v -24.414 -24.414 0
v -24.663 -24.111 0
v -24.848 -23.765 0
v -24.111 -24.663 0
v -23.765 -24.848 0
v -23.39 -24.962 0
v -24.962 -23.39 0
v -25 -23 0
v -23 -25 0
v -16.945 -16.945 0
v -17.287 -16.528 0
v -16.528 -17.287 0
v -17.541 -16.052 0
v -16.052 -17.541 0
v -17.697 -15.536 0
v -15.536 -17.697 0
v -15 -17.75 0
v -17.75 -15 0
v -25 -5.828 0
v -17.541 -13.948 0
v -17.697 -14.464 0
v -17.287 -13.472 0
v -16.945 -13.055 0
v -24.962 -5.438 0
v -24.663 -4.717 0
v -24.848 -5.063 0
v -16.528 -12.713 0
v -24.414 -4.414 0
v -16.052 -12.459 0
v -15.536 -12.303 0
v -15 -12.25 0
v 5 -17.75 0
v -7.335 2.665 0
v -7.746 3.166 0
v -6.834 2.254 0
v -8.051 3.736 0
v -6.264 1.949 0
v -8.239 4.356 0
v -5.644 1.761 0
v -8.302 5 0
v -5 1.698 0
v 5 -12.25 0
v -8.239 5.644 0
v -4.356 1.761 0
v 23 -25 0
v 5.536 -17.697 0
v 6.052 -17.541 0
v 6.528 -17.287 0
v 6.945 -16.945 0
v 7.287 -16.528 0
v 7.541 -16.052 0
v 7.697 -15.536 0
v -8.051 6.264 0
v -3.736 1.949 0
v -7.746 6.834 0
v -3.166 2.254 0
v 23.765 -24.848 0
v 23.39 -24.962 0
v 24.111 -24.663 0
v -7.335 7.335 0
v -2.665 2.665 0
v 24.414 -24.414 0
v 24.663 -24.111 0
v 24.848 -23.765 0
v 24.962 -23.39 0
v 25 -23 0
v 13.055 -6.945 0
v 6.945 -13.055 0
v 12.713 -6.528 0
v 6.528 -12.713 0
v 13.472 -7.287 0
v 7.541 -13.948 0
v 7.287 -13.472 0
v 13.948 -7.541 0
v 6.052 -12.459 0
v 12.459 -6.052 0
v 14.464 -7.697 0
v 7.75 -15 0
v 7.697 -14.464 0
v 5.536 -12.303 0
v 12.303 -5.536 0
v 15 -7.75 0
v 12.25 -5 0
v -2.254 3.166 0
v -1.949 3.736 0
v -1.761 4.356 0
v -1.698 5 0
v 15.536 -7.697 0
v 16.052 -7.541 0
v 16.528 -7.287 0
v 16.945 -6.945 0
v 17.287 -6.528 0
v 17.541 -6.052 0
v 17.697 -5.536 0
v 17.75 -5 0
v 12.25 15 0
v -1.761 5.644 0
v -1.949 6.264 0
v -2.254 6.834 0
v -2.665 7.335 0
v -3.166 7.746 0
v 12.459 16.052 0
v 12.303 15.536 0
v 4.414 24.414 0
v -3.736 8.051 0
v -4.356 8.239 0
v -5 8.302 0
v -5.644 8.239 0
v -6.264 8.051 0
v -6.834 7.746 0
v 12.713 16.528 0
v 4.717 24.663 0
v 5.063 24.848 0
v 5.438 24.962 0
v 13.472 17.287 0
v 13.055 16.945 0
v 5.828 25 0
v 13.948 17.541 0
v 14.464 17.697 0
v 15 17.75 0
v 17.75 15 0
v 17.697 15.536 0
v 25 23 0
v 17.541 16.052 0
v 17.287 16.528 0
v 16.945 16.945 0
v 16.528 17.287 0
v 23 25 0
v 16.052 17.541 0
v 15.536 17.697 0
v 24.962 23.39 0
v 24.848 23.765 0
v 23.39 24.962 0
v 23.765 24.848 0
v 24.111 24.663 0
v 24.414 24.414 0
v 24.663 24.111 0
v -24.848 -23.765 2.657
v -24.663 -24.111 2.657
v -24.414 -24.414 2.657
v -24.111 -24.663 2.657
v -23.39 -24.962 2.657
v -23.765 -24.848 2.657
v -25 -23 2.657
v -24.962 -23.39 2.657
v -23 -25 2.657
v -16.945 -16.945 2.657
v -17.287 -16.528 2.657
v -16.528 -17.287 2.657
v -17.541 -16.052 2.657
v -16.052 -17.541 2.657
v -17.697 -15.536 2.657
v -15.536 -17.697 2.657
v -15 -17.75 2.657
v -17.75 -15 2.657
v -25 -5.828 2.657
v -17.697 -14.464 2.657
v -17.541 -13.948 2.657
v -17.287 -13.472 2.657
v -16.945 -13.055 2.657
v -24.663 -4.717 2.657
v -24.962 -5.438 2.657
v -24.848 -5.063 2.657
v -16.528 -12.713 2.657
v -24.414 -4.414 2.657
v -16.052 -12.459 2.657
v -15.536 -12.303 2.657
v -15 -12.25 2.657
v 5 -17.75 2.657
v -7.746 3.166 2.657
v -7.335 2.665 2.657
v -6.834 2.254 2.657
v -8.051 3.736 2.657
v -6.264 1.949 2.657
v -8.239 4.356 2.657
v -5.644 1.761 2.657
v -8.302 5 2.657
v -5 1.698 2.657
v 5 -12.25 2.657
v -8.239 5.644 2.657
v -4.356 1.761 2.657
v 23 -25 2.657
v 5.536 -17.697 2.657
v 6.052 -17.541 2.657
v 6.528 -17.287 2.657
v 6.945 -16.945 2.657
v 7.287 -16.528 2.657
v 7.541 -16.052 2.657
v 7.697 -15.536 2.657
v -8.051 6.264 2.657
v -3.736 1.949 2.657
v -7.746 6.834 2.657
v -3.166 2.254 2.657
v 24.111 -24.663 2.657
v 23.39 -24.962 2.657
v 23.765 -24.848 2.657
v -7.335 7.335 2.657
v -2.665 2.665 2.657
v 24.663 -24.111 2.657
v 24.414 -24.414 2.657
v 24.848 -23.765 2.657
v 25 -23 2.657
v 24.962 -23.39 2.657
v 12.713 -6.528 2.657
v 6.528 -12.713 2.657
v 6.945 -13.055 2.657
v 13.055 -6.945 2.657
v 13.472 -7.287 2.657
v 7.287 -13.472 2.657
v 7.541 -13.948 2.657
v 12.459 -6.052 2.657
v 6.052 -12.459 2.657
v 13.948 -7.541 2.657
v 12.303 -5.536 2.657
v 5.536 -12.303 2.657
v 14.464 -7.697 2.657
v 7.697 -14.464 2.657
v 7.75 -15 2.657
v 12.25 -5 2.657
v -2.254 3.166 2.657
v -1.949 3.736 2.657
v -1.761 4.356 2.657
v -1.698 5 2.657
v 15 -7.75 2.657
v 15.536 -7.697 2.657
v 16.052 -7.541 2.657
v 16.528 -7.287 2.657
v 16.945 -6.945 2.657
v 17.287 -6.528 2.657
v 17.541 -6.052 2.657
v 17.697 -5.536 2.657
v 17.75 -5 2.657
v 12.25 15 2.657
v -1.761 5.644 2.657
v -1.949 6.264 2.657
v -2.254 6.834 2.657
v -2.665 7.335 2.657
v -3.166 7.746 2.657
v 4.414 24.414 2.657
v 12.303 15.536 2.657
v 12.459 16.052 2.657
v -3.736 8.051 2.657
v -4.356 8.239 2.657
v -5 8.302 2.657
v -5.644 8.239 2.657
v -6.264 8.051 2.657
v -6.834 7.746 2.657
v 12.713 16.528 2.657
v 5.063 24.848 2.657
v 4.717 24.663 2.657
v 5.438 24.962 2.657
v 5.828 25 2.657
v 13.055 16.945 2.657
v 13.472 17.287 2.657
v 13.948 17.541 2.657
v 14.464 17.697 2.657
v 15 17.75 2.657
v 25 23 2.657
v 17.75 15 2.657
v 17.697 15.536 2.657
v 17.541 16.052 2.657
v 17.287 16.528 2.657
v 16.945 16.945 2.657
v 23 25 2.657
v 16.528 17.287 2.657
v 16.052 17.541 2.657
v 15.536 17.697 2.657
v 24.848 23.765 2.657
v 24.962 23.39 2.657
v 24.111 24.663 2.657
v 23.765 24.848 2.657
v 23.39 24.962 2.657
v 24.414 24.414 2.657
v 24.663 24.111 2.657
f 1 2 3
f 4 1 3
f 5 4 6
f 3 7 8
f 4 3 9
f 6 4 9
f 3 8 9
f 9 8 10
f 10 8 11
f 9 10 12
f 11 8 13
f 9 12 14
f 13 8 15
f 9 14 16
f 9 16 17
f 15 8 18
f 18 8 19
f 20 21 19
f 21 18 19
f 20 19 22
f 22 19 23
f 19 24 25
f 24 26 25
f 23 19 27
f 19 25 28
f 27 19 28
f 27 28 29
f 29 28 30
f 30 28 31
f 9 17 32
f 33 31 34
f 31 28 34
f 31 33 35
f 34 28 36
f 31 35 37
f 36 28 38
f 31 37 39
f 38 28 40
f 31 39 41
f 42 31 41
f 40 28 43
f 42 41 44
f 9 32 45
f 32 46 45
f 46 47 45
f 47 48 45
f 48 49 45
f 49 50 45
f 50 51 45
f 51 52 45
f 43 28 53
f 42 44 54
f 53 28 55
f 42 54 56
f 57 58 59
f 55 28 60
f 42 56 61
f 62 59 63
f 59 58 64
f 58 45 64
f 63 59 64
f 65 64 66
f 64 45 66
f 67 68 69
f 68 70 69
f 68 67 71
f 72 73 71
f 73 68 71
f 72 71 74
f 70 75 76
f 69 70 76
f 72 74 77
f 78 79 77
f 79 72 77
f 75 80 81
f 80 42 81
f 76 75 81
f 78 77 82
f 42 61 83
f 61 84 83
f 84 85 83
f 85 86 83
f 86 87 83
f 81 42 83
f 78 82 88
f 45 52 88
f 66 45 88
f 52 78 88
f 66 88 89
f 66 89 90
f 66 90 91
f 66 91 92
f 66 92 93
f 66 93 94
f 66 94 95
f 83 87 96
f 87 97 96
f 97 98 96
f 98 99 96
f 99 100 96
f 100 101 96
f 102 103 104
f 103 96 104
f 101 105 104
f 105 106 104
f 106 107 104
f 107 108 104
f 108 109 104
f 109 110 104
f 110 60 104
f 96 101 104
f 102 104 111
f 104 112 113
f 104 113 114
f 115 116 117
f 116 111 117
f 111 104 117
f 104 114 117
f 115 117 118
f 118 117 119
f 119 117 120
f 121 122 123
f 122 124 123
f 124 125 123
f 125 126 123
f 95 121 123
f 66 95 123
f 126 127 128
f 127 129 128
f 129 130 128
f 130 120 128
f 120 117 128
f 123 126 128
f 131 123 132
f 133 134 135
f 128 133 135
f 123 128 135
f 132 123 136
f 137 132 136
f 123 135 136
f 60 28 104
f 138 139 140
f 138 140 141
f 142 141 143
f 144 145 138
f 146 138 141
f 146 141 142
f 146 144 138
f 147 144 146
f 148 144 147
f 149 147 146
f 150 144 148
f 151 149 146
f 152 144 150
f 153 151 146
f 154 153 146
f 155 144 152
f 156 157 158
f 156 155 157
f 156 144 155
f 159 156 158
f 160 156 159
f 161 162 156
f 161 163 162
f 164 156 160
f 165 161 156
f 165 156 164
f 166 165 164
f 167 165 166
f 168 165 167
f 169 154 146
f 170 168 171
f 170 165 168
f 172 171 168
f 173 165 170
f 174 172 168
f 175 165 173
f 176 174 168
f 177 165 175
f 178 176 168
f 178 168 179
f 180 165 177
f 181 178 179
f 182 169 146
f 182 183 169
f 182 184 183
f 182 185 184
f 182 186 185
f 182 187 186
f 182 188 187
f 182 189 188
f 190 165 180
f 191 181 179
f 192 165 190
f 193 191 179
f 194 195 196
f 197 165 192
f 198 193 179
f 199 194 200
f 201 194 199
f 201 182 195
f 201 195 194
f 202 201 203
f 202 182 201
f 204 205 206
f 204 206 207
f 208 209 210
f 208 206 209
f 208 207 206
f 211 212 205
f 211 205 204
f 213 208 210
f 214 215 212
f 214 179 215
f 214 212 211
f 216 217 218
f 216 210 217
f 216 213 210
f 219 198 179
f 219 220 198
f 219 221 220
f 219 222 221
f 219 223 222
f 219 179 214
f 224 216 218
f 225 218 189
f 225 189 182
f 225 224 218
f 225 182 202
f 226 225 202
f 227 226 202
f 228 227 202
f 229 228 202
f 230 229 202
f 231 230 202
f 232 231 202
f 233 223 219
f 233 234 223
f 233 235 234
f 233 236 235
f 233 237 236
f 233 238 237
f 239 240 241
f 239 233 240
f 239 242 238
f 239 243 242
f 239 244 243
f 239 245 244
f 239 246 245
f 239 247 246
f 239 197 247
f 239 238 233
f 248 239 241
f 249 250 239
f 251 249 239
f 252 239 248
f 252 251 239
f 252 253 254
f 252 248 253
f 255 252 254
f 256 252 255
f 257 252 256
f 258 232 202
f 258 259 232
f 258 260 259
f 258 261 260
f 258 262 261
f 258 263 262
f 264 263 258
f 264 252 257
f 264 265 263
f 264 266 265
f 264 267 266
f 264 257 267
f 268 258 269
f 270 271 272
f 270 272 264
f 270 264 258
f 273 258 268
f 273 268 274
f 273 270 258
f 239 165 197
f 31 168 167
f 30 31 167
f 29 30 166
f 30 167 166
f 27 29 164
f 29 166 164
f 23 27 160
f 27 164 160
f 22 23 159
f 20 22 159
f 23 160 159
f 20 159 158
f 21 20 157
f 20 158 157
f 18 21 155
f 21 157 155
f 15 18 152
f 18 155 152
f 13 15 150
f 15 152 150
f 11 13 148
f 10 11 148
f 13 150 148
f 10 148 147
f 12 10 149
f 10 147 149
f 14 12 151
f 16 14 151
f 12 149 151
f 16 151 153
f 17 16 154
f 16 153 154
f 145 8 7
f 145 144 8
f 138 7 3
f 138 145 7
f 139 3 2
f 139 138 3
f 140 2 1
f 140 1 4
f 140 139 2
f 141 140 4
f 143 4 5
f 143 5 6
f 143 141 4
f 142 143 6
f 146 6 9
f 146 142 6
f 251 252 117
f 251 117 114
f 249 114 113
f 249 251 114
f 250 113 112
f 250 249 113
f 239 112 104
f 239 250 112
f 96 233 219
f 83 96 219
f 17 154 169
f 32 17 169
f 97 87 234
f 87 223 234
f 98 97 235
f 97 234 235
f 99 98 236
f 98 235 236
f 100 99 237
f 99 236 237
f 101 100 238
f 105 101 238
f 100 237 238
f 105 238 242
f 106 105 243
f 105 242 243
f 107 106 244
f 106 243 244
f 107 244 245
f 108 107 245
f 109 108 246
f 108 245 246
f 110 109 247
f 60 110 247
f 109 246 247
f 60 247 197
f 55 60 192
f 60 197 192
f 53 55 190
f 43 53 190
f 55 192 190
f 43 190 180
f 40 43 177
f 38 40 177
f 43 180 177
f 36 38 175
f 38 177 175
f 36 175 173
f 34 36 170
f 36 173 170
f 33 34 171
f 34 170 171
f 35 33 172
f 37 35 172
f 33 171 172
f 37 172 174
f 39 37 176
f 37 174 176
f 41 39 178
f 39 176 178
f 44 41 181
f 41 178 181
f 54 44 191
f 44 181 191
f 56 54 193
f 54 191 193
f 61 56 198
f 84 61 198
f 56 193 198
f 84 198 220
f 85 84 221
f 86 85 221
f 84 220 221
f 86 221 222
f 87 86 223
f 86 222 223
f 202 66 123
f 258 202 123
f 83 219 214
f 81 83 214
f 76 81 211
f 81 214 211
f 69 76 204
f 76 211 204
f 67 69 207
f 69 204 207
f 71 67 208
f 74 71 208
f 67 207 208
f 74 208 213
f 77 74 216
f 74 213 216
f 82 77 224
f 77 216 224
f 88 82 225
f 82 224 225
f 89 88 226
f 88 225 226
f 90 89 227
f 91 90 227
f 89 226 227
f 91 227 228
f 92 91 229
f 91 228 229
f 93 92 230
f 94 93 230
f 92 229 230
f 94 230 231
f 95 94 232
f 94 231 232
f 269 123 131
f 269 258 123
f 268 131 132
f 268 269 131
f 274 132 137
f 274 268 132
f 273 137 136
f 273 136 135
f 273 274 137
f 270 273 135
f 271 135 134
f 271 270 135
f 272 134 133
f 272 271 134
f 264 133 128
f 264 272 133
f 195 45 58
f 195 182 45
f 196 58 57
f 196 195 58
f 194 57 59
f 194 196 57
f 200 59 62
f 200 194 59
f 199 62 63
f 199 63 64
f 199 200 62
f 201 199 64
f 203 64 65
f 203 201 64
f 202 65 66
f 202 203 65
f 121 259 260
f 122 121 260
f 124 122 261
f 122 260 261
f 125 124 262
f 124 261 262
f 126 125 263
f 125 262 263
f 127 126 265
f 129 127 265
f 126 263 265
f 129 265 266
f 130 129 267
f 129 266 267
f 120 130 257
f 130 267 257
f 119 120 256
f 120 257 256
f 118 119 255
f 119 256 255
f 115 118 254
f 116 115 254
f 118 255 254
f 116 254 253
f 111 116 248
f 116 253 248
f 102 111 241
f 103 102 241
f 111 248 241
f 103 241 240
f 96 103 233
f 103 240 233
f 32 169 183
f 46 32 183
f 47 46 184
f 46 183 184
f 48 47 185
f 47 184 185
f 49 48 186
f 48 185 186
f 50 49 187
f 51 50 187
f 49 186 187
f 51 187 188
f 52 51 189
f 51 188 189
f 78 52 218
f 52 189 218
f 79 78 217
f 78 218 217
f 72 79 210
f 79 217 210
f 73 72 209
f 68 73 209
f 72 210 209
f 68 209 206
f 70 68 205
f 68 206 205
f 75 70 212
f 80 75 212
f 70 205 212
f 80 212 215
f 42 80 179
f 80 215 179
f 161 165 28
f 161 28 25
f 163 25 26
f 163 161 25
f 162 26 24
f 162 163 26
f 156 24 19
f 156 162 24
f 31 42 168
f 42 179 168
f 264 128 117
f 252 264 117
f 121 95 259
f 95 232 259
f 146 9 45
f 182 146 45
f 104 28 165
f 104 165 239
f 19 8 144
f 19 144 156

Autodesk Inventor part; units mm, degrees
ref_plane "YZ Plane" through (0, 0, 0) normal (1, 0, 0) x (0, 1, 0)
ref_plane "XZ Plane" through (0, 0, 0) normal (0, 1, 0) x (-1, 0, 0)
ref_plane "XY Plane" through (0, 0, 0) normal (0, 0, 1) x (1, 0, 0)
sketch "Sketch1" plane through (0, 0, 0) normal (0, 0, 1) x (1, 0, 0)
  line L0 (-25, -25) -> (25, -25)
  line L1 (25, -25) -> (25, 25)
  line L2 (25, 25) -> (5, 25)
  line L3 (-25, -25) -> (-25, -5)
  line L4 (-25, -5) -> (5, 25)
  point P0 (0, 0)
  dimension "d0" = 50
  dimension "d1" = 50
  dimension "d2" = 20
  dimension "d3" = 20
  dimension "d21" = 25
  dimension "d22" = 25
extrude "Extrusion1" add sketch "Sketch1" along normal blind 2.6568
sketch "Sketch2" plane through (0, 0, 2.6568) normal (0, 0, 1) x (1, 0, 0)
  line L0 (-25, -25) -> (25, -25) projected
  line L1 (25, -25) -> (25, 25) projected
  line L2 (-15, -15) -> (5, -15) construction
  line L3 (-15, -17.75) -> (5, -17.75)
  line L4 (5, -12.25) -> (-15, -12.25)
  arc A0 (-15, -12.25) -> (-15, -17.75) centre (-15, -15) ccw
  arc A1 (5, -17.75) -> (5, -12.25) centre (5, -15) ccw
  line L5 (15, -5) -> (15, 15) construction
  line L6 (17.75, -5) -> (17.75, 15)
  line L7 (12.25, 15) -> (12.25, -5)
  arc A2 (12.25, -5) -> (17.75, -5) centre (15, -5) ccw
  arc A3 (17.75, 15) -> (12.25, 15) centre (15, 15) ccw
  point P0 (0, 0)
  point P1 (-5, -15)
  point P2 (15, 5)
  dimension "d6" = 20
  dimension "d7" = 5.5
  dimension "d8" = 10
  dimension "d9" = 20
  dimension "d10" = 20
  dimension "d11" = 5.5
  dimension "d12" = 10
  dimension "d13" = 20
extrude "Extrusion2" cut sketch "Sketch2" against normal through all
sketch "Sketch3" plane through (0, 0, 2.6568) normal (0, 0, 1) x (1, 0, 0)
  line L0 (-25, -25) -> (25, -25) projected
  line L1 (25, -25) -> (25, 25) projected
  circle A0 centre (-5, 5) radius 3.302
  point P0 (0, 0)
  dimension "d16" = 6.604
  dimension "d17" = 30
  dimension "d18" = 30
extrude "Extrusion3" cut sketch "Sketch3" against normal through all
fillet "Fillet1" radius 2 5 edges at (-25, -25, 1.3284) (25, -25, 1.3284) (25, 25, 1.3284) (5, 25, 1.3284) (-25, -5, 1.3284)
equation "\"d0\" = d1"
equation "\"d21\" = 0.5 * d1"
equation "\"d22\" = 0.5 * d0"
properties part number "frame_gusset" material "Steel, Mild"
